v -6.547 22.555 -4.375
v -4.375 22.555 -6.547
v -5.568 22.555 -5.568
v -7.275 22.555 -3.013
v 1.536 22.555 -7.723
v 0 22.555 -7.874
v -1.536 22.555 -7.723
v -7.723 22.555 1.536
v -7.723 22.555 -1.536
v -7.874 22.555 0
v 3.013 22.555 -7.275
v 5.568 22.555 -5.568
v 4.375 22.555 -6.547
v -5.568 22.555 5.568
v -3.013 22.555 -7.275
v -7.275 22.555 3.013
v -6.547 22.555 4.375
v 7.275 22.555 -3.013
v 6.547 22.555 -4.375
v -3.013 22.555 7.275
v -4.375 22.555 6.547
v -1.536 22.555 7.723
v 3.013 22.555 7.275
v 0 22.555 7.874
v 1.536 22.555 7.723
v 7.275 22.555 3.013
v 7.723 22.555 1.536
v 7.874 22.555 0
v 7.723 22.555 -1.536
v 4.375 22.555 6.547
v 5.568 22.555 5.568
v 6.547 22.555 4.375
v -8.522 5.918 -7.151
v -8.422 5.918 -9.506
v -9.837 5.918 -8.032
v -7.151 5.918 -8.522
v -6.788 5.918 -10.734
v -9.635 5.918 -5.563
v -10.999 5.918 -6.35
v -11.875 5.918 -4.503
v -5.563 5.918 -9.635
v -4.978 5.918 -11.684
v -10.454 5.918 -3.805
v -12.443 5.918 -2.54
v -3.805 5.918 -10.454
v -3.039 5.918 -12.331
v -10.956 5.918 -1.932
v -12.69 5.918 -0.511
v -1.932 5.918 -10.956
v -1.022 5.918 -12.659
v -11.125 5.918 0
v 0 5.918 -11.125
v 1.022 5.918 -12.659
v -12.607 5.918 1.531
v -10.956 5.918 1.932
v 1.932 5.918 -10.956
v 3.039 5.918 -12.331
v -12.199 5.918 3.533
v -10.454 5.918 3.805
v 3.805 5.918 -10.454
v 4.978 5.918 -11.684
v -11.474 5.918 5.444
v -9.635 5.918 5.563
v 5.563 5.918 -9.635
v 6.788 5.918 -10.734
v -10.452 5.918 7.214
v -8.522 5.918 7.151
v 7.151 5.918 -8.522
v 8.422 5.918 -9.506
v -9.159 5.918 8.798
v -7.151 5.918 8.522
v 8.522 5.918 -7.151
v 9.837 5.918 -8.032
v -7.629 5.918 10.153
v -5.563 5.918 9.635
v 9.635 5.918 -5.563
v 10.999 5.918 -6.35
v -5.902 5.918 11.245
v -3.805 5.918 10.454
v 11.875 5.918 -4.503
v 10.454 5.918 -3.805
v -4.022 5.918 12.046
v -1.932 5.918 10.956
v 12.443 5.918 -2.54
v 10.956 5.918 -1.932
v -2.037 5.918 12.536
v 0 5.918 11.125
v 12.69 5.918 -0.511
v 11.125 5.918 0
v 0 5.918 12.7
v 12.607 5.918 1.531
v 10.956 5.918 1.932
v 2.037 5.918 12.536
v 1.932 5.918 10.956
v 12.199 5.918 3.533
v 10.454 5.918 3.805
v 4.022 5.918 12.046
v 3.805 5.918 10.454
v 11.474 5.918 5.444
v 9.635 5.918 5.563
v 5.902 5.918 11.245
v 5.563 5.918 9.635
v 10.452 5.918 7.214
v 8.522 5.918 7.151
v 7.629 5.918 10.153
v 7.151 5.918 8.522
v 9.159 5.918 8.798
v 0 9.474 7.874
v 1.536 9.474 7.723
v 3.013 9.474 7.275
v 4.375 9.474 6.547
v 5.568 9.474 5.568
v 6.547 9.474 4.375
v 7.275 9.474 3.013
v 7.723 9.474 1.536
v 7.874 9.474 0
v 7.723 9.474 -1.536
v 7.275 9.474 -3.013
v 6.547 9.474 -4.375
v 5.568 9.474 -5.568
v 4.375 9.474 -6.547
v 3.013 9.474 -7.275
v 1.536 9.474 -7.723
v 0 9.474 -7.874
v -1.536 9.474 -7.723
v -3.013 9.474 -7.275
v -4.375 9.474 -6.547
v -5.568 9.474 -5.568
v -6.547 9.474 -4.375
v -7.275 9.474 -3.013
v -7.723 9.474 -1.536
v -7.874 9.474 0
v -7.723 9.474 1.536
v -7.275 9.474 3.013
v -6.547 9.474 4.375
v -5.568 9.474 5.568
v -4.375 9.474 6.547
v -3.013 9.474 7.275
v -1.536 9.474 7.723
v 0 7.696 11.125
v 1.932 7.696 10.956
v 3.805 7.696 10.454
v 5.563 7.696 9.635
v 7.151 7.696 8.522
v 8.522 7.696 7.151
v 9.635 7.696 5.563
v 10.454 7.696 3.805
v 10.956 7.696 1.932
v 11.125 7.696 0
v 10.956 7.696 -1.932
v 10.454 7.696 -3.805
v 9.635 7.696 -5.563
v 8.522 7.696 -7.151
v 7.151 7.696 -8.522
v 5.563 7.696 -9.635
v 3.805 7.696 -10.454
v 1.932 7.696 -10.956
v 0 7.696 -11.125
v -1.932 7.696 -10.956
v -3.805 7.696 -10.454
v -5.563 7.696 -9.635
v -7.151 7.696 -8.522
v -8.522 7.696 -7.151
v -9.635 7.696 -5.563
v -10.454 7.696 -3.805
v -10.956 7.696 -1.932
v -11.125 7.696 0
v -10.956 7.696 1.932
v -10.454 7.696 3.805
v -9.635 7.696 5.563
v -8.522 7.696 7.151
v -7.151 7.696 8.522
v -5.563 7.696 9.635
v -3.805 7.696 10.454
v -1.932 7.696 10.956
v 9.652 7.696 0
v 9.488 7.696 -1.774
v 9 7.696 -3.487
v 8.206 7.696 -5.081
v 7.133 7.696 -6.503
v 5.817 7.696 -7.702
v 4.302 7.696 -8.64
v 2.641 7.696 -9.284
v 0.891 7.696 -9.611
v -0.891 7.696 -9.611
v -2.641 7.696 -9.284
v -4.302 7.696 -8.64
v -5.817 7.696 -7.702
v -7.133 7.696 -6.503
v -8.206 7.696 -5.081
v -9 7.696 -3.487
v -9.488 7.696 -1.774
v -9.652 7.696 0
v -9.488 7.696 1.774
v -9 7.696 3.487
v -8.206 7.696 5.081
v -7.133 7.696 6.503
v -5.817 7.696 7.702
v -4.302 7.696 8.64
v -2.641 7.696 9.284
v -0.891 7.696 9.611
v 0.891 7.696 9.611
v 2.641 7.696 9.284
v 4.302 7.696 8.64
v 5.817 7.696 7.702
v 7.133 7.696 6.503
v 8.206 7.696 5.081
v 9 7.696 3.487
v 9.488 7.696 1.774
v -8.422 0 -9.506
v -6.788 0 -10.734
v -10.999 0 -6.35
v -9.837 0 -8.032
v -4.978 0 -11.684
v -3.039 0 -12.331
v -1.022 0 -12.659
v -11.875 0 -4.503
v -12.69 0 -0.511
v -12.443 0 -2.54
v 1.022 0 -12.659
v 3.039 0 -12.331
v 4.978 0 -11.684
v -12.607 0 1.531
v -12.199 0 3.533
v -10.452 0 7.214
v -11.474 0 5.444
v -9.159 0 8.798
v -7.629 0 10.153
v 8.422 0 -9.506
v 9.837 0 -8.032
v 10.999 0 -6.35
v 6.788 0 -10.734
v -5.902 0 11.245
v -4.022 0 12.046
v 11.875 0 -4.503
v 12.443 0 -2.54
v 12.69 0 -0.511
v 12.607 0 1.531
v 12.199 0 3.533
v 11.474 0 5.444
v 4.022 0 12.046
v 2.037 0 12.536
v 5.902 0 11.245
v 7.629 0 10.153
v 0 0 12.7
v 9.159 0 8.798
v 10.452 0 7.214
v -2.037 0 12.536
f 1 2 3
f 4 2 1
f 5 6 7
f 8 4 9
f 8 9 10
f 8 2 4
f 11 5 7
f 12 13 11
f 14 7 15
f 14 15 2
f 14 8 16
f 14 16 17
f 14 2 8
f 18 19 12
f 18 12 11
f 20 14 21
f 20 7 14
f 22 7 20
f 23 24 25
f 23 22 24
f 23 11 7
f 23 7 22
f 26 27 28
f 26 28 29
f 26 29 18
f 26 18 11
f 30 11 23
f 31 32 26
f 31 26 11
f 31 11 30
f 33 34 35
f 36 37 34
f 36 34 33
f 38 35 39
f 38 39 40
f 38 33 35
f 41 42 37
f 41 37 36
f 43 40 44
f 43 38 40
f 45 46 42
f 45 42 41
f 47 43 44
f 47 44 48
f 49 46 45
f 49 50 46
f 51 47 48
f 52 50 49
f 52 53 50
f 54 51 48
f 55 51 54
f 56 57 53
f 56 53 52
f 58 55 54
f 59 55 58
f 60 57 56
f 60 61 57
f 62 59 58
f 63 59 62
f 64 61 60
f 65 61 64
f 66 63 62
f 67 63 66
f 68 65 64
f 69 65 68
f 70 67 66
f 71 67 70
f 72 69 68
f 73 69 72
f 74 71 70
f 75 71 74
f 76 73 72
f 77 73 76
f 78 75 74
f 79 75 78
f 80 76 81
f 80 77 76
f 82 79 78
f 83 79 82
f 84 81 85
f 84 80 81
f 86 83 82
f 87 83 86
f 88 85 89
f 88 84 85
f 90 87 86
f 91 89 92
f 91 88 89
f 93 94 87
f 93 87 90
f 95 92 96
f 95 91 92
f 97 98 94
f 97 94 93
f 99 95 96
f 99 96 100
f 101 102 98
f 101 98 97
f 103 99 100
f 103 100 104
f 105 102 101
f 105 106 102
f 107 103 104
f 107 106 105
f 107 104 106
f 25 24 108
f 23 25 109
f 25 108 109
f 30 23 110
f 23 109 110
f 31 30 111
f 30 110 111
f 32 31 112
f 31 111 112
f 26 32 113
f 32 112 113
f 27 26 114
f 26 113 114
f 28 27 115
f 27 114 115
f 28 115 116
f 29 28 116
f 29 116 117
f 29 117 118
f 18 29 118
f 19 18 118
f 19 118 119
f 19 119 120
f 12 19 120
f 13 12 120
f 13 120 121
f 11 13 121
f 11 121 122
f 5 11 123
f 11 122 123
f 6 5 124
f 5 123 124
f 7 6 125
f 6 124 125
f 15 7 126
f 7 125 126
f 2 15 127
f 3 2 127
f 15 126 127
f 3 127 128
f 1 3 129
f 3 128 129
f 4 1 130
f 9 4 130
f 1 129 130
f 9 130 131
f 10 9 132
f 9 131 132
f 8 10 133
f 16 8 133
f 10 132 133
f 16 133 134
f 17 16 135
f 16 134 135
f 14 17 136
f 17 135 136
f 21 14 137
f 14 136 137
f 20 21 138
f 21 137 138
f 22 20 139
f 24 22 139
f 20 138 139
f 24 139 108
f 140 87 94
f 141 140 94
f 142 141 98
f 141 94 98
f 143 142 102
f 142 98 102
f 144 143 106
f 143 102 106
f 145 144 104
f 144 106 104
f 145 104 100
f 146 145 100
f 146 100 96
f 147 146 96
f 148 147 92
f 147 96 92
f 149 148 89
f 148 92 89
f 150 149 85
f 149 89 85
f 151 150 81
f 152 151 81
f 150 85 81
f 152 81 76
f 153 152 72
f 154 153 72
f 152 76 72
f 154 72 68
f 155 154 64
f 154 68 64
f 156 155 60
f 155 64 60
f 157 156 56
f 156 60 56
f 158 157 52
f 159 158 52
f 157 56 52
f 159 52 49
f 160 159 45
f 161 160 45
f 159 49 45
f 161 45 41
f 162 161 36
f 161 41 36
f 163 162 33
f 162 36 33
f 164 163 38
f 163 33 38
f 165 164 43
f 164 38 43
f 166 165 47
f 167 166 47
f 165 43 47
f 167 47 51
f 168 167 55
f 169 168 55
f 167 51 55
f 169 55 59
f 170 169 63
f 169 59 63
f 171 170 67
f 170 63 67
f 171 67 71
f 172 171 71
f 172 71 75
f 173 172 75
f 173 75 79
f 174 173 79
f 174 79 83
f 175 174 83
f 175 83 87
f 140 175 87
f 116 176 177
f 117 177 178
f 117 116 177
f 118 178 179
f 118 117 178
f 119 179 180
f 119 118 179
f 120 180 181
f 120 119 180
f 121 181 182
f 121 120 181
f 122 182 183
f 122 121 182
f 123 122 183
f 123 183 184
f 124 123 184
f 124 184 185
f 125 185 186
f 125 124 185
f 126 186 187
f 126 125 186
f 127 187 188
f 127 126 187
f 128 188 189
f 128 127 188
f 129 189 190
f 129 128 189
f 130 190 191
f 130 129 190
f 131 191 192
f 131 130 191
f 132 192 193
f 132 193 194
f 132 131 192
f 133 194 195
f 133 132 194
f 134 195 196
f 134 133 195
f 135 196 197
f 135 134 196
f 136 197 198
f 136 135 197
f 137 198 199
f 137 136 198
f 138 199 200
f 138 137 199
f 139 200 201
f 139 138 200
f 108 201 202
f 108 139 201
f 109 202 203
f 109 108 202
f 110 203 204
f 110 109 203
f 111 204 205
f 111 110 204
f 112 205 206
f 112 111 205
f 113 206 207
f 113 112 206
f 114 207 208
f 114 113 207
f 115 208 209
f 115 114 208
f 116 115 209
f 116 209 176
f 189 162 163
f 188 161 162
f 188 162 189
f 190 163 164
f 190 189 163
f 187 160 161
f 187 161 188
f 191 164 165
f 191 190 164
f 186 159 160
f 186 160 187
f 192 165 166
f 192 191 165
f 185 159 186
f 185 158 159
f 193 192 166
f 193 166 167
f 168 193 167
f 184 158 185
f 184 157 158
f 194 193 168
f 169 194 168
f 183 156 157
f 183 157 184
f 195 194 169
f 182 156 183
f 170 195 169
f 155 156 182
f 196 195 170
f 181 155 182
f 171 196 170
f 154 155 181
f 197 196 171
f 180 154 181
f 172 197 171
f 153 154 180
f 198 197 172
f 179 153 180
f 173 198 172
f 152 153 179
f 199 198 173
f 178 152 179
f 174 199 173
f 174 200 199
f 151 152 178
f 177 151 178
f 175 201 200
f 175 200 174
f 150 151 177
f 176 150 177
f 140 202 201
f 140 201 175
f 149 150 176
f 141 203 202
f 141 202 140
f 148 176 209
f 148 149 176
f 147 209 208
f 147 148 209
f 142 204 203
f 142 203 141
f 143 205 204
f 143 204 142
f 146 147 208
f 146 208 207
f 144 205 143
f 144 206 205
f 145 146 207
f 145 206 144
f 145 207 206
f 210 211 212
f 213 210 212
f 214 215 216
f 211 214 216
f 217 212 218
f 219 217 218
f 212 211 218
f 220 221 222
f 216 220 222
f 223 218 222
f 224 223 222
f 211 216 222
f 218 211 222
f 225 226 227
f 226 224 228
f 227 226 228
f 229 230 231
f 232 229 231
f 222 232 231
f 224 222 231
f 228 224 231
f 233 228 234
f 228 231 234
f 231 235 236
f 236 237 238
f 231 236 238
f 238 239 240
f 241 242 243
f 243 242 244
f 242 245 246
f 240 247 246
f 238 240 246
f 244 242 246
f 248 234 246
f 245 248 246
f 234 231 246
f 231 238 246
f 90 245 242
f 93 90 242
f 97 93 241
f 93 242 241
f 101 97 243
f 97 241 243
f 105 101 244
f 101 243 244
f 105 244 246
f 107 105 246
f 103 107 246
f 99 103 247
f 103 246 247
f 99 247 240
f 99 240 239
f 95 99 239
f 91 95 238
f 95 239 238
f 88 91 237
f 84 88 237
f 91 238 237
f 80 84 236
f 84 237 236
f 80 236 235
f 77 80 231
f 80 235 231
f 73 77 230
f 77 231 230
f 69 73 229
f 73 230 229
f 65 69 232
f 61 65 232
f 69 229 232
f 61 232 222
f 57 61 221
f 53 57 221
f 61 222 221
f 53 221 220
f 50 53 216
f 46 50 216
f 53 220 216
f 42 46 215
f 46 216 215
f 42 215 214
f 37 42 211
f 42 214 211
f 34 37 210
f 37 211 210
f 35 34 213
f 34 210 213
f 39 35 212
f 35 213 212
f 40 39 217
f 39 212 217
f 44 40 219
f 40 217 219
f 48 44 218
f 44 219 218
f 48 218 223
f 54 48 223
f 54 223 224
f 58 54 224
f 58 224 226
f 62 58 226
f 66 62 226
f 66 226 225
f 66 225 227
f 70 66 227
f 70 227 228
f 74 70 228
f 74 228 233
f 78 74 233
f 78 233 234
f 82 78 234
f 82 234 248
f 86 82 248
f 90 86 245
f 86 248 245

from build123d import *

# Parameters (mm, degrees)
SKETCH1_R           = 12.7
BOSS_EXTRUDE1_DEPTH = 5.9182
SKETCH3_R           = 11.1252
BOSS_EXTRUDE2_DEPTH = 1.778
SKETCH4_R           = 7.874
BOSS_EXTRUDE3_DEPTH = 14.859


with BuildPart() as part:
    # Sketch1 → Boss-Extrude1 (new body)
    with BuildSketch(Plane(origin=(0, 0, 0), x_dir=(1, 0, 0), z_dir=(0, 1, 0))):
        with Locations(Location((0, 0, 0), (0, 0, 270))):
            Circle(SKETCH1_R)
    extrude(amount=BOSS_EXTRUDE1_DEPTH)

    # Sketch3 → Boss-Extrude2 (add)
    with BuildSketch(Plane(origin=(0, 5.9182, 0), x_dir=(1, 0, 0), z_dir=(0, 1, 0))):
        with Locations(Location((0, 0, 0), (0, 0, 270))):
            Circle(SKETCH3_R)
    extrude(amount=BOSS_EXTRUDE2_DEPTH)

    # Sketch4 → Boss-Extrude3 (add)
    with BuildSketch(Plane(origin=(0, 7.6962, 0), x_dir=(1, 0, 0), z_dir=(0, 1, 0))):
        with Locations(Location((0, 0, 0), (0, 0, 270))):
            Circle(SKETCH4_R)
    extrude(amount=BOSS_EXTRUDE3_DEPTH)

    # Chamfer2: read off the stored shape, not the designer's step
    # Chamfer2 outline → Chamfer2 (revolve)
    with BuildSketch(Plane.XY):
        Polygon((9.652, 7.6962), (7.874, 9.4742), (7.874, 7.6962), align=None)
    revolve(axis=Axis((0, 0, 0), (0, 1, 0)))


solid = part.part
